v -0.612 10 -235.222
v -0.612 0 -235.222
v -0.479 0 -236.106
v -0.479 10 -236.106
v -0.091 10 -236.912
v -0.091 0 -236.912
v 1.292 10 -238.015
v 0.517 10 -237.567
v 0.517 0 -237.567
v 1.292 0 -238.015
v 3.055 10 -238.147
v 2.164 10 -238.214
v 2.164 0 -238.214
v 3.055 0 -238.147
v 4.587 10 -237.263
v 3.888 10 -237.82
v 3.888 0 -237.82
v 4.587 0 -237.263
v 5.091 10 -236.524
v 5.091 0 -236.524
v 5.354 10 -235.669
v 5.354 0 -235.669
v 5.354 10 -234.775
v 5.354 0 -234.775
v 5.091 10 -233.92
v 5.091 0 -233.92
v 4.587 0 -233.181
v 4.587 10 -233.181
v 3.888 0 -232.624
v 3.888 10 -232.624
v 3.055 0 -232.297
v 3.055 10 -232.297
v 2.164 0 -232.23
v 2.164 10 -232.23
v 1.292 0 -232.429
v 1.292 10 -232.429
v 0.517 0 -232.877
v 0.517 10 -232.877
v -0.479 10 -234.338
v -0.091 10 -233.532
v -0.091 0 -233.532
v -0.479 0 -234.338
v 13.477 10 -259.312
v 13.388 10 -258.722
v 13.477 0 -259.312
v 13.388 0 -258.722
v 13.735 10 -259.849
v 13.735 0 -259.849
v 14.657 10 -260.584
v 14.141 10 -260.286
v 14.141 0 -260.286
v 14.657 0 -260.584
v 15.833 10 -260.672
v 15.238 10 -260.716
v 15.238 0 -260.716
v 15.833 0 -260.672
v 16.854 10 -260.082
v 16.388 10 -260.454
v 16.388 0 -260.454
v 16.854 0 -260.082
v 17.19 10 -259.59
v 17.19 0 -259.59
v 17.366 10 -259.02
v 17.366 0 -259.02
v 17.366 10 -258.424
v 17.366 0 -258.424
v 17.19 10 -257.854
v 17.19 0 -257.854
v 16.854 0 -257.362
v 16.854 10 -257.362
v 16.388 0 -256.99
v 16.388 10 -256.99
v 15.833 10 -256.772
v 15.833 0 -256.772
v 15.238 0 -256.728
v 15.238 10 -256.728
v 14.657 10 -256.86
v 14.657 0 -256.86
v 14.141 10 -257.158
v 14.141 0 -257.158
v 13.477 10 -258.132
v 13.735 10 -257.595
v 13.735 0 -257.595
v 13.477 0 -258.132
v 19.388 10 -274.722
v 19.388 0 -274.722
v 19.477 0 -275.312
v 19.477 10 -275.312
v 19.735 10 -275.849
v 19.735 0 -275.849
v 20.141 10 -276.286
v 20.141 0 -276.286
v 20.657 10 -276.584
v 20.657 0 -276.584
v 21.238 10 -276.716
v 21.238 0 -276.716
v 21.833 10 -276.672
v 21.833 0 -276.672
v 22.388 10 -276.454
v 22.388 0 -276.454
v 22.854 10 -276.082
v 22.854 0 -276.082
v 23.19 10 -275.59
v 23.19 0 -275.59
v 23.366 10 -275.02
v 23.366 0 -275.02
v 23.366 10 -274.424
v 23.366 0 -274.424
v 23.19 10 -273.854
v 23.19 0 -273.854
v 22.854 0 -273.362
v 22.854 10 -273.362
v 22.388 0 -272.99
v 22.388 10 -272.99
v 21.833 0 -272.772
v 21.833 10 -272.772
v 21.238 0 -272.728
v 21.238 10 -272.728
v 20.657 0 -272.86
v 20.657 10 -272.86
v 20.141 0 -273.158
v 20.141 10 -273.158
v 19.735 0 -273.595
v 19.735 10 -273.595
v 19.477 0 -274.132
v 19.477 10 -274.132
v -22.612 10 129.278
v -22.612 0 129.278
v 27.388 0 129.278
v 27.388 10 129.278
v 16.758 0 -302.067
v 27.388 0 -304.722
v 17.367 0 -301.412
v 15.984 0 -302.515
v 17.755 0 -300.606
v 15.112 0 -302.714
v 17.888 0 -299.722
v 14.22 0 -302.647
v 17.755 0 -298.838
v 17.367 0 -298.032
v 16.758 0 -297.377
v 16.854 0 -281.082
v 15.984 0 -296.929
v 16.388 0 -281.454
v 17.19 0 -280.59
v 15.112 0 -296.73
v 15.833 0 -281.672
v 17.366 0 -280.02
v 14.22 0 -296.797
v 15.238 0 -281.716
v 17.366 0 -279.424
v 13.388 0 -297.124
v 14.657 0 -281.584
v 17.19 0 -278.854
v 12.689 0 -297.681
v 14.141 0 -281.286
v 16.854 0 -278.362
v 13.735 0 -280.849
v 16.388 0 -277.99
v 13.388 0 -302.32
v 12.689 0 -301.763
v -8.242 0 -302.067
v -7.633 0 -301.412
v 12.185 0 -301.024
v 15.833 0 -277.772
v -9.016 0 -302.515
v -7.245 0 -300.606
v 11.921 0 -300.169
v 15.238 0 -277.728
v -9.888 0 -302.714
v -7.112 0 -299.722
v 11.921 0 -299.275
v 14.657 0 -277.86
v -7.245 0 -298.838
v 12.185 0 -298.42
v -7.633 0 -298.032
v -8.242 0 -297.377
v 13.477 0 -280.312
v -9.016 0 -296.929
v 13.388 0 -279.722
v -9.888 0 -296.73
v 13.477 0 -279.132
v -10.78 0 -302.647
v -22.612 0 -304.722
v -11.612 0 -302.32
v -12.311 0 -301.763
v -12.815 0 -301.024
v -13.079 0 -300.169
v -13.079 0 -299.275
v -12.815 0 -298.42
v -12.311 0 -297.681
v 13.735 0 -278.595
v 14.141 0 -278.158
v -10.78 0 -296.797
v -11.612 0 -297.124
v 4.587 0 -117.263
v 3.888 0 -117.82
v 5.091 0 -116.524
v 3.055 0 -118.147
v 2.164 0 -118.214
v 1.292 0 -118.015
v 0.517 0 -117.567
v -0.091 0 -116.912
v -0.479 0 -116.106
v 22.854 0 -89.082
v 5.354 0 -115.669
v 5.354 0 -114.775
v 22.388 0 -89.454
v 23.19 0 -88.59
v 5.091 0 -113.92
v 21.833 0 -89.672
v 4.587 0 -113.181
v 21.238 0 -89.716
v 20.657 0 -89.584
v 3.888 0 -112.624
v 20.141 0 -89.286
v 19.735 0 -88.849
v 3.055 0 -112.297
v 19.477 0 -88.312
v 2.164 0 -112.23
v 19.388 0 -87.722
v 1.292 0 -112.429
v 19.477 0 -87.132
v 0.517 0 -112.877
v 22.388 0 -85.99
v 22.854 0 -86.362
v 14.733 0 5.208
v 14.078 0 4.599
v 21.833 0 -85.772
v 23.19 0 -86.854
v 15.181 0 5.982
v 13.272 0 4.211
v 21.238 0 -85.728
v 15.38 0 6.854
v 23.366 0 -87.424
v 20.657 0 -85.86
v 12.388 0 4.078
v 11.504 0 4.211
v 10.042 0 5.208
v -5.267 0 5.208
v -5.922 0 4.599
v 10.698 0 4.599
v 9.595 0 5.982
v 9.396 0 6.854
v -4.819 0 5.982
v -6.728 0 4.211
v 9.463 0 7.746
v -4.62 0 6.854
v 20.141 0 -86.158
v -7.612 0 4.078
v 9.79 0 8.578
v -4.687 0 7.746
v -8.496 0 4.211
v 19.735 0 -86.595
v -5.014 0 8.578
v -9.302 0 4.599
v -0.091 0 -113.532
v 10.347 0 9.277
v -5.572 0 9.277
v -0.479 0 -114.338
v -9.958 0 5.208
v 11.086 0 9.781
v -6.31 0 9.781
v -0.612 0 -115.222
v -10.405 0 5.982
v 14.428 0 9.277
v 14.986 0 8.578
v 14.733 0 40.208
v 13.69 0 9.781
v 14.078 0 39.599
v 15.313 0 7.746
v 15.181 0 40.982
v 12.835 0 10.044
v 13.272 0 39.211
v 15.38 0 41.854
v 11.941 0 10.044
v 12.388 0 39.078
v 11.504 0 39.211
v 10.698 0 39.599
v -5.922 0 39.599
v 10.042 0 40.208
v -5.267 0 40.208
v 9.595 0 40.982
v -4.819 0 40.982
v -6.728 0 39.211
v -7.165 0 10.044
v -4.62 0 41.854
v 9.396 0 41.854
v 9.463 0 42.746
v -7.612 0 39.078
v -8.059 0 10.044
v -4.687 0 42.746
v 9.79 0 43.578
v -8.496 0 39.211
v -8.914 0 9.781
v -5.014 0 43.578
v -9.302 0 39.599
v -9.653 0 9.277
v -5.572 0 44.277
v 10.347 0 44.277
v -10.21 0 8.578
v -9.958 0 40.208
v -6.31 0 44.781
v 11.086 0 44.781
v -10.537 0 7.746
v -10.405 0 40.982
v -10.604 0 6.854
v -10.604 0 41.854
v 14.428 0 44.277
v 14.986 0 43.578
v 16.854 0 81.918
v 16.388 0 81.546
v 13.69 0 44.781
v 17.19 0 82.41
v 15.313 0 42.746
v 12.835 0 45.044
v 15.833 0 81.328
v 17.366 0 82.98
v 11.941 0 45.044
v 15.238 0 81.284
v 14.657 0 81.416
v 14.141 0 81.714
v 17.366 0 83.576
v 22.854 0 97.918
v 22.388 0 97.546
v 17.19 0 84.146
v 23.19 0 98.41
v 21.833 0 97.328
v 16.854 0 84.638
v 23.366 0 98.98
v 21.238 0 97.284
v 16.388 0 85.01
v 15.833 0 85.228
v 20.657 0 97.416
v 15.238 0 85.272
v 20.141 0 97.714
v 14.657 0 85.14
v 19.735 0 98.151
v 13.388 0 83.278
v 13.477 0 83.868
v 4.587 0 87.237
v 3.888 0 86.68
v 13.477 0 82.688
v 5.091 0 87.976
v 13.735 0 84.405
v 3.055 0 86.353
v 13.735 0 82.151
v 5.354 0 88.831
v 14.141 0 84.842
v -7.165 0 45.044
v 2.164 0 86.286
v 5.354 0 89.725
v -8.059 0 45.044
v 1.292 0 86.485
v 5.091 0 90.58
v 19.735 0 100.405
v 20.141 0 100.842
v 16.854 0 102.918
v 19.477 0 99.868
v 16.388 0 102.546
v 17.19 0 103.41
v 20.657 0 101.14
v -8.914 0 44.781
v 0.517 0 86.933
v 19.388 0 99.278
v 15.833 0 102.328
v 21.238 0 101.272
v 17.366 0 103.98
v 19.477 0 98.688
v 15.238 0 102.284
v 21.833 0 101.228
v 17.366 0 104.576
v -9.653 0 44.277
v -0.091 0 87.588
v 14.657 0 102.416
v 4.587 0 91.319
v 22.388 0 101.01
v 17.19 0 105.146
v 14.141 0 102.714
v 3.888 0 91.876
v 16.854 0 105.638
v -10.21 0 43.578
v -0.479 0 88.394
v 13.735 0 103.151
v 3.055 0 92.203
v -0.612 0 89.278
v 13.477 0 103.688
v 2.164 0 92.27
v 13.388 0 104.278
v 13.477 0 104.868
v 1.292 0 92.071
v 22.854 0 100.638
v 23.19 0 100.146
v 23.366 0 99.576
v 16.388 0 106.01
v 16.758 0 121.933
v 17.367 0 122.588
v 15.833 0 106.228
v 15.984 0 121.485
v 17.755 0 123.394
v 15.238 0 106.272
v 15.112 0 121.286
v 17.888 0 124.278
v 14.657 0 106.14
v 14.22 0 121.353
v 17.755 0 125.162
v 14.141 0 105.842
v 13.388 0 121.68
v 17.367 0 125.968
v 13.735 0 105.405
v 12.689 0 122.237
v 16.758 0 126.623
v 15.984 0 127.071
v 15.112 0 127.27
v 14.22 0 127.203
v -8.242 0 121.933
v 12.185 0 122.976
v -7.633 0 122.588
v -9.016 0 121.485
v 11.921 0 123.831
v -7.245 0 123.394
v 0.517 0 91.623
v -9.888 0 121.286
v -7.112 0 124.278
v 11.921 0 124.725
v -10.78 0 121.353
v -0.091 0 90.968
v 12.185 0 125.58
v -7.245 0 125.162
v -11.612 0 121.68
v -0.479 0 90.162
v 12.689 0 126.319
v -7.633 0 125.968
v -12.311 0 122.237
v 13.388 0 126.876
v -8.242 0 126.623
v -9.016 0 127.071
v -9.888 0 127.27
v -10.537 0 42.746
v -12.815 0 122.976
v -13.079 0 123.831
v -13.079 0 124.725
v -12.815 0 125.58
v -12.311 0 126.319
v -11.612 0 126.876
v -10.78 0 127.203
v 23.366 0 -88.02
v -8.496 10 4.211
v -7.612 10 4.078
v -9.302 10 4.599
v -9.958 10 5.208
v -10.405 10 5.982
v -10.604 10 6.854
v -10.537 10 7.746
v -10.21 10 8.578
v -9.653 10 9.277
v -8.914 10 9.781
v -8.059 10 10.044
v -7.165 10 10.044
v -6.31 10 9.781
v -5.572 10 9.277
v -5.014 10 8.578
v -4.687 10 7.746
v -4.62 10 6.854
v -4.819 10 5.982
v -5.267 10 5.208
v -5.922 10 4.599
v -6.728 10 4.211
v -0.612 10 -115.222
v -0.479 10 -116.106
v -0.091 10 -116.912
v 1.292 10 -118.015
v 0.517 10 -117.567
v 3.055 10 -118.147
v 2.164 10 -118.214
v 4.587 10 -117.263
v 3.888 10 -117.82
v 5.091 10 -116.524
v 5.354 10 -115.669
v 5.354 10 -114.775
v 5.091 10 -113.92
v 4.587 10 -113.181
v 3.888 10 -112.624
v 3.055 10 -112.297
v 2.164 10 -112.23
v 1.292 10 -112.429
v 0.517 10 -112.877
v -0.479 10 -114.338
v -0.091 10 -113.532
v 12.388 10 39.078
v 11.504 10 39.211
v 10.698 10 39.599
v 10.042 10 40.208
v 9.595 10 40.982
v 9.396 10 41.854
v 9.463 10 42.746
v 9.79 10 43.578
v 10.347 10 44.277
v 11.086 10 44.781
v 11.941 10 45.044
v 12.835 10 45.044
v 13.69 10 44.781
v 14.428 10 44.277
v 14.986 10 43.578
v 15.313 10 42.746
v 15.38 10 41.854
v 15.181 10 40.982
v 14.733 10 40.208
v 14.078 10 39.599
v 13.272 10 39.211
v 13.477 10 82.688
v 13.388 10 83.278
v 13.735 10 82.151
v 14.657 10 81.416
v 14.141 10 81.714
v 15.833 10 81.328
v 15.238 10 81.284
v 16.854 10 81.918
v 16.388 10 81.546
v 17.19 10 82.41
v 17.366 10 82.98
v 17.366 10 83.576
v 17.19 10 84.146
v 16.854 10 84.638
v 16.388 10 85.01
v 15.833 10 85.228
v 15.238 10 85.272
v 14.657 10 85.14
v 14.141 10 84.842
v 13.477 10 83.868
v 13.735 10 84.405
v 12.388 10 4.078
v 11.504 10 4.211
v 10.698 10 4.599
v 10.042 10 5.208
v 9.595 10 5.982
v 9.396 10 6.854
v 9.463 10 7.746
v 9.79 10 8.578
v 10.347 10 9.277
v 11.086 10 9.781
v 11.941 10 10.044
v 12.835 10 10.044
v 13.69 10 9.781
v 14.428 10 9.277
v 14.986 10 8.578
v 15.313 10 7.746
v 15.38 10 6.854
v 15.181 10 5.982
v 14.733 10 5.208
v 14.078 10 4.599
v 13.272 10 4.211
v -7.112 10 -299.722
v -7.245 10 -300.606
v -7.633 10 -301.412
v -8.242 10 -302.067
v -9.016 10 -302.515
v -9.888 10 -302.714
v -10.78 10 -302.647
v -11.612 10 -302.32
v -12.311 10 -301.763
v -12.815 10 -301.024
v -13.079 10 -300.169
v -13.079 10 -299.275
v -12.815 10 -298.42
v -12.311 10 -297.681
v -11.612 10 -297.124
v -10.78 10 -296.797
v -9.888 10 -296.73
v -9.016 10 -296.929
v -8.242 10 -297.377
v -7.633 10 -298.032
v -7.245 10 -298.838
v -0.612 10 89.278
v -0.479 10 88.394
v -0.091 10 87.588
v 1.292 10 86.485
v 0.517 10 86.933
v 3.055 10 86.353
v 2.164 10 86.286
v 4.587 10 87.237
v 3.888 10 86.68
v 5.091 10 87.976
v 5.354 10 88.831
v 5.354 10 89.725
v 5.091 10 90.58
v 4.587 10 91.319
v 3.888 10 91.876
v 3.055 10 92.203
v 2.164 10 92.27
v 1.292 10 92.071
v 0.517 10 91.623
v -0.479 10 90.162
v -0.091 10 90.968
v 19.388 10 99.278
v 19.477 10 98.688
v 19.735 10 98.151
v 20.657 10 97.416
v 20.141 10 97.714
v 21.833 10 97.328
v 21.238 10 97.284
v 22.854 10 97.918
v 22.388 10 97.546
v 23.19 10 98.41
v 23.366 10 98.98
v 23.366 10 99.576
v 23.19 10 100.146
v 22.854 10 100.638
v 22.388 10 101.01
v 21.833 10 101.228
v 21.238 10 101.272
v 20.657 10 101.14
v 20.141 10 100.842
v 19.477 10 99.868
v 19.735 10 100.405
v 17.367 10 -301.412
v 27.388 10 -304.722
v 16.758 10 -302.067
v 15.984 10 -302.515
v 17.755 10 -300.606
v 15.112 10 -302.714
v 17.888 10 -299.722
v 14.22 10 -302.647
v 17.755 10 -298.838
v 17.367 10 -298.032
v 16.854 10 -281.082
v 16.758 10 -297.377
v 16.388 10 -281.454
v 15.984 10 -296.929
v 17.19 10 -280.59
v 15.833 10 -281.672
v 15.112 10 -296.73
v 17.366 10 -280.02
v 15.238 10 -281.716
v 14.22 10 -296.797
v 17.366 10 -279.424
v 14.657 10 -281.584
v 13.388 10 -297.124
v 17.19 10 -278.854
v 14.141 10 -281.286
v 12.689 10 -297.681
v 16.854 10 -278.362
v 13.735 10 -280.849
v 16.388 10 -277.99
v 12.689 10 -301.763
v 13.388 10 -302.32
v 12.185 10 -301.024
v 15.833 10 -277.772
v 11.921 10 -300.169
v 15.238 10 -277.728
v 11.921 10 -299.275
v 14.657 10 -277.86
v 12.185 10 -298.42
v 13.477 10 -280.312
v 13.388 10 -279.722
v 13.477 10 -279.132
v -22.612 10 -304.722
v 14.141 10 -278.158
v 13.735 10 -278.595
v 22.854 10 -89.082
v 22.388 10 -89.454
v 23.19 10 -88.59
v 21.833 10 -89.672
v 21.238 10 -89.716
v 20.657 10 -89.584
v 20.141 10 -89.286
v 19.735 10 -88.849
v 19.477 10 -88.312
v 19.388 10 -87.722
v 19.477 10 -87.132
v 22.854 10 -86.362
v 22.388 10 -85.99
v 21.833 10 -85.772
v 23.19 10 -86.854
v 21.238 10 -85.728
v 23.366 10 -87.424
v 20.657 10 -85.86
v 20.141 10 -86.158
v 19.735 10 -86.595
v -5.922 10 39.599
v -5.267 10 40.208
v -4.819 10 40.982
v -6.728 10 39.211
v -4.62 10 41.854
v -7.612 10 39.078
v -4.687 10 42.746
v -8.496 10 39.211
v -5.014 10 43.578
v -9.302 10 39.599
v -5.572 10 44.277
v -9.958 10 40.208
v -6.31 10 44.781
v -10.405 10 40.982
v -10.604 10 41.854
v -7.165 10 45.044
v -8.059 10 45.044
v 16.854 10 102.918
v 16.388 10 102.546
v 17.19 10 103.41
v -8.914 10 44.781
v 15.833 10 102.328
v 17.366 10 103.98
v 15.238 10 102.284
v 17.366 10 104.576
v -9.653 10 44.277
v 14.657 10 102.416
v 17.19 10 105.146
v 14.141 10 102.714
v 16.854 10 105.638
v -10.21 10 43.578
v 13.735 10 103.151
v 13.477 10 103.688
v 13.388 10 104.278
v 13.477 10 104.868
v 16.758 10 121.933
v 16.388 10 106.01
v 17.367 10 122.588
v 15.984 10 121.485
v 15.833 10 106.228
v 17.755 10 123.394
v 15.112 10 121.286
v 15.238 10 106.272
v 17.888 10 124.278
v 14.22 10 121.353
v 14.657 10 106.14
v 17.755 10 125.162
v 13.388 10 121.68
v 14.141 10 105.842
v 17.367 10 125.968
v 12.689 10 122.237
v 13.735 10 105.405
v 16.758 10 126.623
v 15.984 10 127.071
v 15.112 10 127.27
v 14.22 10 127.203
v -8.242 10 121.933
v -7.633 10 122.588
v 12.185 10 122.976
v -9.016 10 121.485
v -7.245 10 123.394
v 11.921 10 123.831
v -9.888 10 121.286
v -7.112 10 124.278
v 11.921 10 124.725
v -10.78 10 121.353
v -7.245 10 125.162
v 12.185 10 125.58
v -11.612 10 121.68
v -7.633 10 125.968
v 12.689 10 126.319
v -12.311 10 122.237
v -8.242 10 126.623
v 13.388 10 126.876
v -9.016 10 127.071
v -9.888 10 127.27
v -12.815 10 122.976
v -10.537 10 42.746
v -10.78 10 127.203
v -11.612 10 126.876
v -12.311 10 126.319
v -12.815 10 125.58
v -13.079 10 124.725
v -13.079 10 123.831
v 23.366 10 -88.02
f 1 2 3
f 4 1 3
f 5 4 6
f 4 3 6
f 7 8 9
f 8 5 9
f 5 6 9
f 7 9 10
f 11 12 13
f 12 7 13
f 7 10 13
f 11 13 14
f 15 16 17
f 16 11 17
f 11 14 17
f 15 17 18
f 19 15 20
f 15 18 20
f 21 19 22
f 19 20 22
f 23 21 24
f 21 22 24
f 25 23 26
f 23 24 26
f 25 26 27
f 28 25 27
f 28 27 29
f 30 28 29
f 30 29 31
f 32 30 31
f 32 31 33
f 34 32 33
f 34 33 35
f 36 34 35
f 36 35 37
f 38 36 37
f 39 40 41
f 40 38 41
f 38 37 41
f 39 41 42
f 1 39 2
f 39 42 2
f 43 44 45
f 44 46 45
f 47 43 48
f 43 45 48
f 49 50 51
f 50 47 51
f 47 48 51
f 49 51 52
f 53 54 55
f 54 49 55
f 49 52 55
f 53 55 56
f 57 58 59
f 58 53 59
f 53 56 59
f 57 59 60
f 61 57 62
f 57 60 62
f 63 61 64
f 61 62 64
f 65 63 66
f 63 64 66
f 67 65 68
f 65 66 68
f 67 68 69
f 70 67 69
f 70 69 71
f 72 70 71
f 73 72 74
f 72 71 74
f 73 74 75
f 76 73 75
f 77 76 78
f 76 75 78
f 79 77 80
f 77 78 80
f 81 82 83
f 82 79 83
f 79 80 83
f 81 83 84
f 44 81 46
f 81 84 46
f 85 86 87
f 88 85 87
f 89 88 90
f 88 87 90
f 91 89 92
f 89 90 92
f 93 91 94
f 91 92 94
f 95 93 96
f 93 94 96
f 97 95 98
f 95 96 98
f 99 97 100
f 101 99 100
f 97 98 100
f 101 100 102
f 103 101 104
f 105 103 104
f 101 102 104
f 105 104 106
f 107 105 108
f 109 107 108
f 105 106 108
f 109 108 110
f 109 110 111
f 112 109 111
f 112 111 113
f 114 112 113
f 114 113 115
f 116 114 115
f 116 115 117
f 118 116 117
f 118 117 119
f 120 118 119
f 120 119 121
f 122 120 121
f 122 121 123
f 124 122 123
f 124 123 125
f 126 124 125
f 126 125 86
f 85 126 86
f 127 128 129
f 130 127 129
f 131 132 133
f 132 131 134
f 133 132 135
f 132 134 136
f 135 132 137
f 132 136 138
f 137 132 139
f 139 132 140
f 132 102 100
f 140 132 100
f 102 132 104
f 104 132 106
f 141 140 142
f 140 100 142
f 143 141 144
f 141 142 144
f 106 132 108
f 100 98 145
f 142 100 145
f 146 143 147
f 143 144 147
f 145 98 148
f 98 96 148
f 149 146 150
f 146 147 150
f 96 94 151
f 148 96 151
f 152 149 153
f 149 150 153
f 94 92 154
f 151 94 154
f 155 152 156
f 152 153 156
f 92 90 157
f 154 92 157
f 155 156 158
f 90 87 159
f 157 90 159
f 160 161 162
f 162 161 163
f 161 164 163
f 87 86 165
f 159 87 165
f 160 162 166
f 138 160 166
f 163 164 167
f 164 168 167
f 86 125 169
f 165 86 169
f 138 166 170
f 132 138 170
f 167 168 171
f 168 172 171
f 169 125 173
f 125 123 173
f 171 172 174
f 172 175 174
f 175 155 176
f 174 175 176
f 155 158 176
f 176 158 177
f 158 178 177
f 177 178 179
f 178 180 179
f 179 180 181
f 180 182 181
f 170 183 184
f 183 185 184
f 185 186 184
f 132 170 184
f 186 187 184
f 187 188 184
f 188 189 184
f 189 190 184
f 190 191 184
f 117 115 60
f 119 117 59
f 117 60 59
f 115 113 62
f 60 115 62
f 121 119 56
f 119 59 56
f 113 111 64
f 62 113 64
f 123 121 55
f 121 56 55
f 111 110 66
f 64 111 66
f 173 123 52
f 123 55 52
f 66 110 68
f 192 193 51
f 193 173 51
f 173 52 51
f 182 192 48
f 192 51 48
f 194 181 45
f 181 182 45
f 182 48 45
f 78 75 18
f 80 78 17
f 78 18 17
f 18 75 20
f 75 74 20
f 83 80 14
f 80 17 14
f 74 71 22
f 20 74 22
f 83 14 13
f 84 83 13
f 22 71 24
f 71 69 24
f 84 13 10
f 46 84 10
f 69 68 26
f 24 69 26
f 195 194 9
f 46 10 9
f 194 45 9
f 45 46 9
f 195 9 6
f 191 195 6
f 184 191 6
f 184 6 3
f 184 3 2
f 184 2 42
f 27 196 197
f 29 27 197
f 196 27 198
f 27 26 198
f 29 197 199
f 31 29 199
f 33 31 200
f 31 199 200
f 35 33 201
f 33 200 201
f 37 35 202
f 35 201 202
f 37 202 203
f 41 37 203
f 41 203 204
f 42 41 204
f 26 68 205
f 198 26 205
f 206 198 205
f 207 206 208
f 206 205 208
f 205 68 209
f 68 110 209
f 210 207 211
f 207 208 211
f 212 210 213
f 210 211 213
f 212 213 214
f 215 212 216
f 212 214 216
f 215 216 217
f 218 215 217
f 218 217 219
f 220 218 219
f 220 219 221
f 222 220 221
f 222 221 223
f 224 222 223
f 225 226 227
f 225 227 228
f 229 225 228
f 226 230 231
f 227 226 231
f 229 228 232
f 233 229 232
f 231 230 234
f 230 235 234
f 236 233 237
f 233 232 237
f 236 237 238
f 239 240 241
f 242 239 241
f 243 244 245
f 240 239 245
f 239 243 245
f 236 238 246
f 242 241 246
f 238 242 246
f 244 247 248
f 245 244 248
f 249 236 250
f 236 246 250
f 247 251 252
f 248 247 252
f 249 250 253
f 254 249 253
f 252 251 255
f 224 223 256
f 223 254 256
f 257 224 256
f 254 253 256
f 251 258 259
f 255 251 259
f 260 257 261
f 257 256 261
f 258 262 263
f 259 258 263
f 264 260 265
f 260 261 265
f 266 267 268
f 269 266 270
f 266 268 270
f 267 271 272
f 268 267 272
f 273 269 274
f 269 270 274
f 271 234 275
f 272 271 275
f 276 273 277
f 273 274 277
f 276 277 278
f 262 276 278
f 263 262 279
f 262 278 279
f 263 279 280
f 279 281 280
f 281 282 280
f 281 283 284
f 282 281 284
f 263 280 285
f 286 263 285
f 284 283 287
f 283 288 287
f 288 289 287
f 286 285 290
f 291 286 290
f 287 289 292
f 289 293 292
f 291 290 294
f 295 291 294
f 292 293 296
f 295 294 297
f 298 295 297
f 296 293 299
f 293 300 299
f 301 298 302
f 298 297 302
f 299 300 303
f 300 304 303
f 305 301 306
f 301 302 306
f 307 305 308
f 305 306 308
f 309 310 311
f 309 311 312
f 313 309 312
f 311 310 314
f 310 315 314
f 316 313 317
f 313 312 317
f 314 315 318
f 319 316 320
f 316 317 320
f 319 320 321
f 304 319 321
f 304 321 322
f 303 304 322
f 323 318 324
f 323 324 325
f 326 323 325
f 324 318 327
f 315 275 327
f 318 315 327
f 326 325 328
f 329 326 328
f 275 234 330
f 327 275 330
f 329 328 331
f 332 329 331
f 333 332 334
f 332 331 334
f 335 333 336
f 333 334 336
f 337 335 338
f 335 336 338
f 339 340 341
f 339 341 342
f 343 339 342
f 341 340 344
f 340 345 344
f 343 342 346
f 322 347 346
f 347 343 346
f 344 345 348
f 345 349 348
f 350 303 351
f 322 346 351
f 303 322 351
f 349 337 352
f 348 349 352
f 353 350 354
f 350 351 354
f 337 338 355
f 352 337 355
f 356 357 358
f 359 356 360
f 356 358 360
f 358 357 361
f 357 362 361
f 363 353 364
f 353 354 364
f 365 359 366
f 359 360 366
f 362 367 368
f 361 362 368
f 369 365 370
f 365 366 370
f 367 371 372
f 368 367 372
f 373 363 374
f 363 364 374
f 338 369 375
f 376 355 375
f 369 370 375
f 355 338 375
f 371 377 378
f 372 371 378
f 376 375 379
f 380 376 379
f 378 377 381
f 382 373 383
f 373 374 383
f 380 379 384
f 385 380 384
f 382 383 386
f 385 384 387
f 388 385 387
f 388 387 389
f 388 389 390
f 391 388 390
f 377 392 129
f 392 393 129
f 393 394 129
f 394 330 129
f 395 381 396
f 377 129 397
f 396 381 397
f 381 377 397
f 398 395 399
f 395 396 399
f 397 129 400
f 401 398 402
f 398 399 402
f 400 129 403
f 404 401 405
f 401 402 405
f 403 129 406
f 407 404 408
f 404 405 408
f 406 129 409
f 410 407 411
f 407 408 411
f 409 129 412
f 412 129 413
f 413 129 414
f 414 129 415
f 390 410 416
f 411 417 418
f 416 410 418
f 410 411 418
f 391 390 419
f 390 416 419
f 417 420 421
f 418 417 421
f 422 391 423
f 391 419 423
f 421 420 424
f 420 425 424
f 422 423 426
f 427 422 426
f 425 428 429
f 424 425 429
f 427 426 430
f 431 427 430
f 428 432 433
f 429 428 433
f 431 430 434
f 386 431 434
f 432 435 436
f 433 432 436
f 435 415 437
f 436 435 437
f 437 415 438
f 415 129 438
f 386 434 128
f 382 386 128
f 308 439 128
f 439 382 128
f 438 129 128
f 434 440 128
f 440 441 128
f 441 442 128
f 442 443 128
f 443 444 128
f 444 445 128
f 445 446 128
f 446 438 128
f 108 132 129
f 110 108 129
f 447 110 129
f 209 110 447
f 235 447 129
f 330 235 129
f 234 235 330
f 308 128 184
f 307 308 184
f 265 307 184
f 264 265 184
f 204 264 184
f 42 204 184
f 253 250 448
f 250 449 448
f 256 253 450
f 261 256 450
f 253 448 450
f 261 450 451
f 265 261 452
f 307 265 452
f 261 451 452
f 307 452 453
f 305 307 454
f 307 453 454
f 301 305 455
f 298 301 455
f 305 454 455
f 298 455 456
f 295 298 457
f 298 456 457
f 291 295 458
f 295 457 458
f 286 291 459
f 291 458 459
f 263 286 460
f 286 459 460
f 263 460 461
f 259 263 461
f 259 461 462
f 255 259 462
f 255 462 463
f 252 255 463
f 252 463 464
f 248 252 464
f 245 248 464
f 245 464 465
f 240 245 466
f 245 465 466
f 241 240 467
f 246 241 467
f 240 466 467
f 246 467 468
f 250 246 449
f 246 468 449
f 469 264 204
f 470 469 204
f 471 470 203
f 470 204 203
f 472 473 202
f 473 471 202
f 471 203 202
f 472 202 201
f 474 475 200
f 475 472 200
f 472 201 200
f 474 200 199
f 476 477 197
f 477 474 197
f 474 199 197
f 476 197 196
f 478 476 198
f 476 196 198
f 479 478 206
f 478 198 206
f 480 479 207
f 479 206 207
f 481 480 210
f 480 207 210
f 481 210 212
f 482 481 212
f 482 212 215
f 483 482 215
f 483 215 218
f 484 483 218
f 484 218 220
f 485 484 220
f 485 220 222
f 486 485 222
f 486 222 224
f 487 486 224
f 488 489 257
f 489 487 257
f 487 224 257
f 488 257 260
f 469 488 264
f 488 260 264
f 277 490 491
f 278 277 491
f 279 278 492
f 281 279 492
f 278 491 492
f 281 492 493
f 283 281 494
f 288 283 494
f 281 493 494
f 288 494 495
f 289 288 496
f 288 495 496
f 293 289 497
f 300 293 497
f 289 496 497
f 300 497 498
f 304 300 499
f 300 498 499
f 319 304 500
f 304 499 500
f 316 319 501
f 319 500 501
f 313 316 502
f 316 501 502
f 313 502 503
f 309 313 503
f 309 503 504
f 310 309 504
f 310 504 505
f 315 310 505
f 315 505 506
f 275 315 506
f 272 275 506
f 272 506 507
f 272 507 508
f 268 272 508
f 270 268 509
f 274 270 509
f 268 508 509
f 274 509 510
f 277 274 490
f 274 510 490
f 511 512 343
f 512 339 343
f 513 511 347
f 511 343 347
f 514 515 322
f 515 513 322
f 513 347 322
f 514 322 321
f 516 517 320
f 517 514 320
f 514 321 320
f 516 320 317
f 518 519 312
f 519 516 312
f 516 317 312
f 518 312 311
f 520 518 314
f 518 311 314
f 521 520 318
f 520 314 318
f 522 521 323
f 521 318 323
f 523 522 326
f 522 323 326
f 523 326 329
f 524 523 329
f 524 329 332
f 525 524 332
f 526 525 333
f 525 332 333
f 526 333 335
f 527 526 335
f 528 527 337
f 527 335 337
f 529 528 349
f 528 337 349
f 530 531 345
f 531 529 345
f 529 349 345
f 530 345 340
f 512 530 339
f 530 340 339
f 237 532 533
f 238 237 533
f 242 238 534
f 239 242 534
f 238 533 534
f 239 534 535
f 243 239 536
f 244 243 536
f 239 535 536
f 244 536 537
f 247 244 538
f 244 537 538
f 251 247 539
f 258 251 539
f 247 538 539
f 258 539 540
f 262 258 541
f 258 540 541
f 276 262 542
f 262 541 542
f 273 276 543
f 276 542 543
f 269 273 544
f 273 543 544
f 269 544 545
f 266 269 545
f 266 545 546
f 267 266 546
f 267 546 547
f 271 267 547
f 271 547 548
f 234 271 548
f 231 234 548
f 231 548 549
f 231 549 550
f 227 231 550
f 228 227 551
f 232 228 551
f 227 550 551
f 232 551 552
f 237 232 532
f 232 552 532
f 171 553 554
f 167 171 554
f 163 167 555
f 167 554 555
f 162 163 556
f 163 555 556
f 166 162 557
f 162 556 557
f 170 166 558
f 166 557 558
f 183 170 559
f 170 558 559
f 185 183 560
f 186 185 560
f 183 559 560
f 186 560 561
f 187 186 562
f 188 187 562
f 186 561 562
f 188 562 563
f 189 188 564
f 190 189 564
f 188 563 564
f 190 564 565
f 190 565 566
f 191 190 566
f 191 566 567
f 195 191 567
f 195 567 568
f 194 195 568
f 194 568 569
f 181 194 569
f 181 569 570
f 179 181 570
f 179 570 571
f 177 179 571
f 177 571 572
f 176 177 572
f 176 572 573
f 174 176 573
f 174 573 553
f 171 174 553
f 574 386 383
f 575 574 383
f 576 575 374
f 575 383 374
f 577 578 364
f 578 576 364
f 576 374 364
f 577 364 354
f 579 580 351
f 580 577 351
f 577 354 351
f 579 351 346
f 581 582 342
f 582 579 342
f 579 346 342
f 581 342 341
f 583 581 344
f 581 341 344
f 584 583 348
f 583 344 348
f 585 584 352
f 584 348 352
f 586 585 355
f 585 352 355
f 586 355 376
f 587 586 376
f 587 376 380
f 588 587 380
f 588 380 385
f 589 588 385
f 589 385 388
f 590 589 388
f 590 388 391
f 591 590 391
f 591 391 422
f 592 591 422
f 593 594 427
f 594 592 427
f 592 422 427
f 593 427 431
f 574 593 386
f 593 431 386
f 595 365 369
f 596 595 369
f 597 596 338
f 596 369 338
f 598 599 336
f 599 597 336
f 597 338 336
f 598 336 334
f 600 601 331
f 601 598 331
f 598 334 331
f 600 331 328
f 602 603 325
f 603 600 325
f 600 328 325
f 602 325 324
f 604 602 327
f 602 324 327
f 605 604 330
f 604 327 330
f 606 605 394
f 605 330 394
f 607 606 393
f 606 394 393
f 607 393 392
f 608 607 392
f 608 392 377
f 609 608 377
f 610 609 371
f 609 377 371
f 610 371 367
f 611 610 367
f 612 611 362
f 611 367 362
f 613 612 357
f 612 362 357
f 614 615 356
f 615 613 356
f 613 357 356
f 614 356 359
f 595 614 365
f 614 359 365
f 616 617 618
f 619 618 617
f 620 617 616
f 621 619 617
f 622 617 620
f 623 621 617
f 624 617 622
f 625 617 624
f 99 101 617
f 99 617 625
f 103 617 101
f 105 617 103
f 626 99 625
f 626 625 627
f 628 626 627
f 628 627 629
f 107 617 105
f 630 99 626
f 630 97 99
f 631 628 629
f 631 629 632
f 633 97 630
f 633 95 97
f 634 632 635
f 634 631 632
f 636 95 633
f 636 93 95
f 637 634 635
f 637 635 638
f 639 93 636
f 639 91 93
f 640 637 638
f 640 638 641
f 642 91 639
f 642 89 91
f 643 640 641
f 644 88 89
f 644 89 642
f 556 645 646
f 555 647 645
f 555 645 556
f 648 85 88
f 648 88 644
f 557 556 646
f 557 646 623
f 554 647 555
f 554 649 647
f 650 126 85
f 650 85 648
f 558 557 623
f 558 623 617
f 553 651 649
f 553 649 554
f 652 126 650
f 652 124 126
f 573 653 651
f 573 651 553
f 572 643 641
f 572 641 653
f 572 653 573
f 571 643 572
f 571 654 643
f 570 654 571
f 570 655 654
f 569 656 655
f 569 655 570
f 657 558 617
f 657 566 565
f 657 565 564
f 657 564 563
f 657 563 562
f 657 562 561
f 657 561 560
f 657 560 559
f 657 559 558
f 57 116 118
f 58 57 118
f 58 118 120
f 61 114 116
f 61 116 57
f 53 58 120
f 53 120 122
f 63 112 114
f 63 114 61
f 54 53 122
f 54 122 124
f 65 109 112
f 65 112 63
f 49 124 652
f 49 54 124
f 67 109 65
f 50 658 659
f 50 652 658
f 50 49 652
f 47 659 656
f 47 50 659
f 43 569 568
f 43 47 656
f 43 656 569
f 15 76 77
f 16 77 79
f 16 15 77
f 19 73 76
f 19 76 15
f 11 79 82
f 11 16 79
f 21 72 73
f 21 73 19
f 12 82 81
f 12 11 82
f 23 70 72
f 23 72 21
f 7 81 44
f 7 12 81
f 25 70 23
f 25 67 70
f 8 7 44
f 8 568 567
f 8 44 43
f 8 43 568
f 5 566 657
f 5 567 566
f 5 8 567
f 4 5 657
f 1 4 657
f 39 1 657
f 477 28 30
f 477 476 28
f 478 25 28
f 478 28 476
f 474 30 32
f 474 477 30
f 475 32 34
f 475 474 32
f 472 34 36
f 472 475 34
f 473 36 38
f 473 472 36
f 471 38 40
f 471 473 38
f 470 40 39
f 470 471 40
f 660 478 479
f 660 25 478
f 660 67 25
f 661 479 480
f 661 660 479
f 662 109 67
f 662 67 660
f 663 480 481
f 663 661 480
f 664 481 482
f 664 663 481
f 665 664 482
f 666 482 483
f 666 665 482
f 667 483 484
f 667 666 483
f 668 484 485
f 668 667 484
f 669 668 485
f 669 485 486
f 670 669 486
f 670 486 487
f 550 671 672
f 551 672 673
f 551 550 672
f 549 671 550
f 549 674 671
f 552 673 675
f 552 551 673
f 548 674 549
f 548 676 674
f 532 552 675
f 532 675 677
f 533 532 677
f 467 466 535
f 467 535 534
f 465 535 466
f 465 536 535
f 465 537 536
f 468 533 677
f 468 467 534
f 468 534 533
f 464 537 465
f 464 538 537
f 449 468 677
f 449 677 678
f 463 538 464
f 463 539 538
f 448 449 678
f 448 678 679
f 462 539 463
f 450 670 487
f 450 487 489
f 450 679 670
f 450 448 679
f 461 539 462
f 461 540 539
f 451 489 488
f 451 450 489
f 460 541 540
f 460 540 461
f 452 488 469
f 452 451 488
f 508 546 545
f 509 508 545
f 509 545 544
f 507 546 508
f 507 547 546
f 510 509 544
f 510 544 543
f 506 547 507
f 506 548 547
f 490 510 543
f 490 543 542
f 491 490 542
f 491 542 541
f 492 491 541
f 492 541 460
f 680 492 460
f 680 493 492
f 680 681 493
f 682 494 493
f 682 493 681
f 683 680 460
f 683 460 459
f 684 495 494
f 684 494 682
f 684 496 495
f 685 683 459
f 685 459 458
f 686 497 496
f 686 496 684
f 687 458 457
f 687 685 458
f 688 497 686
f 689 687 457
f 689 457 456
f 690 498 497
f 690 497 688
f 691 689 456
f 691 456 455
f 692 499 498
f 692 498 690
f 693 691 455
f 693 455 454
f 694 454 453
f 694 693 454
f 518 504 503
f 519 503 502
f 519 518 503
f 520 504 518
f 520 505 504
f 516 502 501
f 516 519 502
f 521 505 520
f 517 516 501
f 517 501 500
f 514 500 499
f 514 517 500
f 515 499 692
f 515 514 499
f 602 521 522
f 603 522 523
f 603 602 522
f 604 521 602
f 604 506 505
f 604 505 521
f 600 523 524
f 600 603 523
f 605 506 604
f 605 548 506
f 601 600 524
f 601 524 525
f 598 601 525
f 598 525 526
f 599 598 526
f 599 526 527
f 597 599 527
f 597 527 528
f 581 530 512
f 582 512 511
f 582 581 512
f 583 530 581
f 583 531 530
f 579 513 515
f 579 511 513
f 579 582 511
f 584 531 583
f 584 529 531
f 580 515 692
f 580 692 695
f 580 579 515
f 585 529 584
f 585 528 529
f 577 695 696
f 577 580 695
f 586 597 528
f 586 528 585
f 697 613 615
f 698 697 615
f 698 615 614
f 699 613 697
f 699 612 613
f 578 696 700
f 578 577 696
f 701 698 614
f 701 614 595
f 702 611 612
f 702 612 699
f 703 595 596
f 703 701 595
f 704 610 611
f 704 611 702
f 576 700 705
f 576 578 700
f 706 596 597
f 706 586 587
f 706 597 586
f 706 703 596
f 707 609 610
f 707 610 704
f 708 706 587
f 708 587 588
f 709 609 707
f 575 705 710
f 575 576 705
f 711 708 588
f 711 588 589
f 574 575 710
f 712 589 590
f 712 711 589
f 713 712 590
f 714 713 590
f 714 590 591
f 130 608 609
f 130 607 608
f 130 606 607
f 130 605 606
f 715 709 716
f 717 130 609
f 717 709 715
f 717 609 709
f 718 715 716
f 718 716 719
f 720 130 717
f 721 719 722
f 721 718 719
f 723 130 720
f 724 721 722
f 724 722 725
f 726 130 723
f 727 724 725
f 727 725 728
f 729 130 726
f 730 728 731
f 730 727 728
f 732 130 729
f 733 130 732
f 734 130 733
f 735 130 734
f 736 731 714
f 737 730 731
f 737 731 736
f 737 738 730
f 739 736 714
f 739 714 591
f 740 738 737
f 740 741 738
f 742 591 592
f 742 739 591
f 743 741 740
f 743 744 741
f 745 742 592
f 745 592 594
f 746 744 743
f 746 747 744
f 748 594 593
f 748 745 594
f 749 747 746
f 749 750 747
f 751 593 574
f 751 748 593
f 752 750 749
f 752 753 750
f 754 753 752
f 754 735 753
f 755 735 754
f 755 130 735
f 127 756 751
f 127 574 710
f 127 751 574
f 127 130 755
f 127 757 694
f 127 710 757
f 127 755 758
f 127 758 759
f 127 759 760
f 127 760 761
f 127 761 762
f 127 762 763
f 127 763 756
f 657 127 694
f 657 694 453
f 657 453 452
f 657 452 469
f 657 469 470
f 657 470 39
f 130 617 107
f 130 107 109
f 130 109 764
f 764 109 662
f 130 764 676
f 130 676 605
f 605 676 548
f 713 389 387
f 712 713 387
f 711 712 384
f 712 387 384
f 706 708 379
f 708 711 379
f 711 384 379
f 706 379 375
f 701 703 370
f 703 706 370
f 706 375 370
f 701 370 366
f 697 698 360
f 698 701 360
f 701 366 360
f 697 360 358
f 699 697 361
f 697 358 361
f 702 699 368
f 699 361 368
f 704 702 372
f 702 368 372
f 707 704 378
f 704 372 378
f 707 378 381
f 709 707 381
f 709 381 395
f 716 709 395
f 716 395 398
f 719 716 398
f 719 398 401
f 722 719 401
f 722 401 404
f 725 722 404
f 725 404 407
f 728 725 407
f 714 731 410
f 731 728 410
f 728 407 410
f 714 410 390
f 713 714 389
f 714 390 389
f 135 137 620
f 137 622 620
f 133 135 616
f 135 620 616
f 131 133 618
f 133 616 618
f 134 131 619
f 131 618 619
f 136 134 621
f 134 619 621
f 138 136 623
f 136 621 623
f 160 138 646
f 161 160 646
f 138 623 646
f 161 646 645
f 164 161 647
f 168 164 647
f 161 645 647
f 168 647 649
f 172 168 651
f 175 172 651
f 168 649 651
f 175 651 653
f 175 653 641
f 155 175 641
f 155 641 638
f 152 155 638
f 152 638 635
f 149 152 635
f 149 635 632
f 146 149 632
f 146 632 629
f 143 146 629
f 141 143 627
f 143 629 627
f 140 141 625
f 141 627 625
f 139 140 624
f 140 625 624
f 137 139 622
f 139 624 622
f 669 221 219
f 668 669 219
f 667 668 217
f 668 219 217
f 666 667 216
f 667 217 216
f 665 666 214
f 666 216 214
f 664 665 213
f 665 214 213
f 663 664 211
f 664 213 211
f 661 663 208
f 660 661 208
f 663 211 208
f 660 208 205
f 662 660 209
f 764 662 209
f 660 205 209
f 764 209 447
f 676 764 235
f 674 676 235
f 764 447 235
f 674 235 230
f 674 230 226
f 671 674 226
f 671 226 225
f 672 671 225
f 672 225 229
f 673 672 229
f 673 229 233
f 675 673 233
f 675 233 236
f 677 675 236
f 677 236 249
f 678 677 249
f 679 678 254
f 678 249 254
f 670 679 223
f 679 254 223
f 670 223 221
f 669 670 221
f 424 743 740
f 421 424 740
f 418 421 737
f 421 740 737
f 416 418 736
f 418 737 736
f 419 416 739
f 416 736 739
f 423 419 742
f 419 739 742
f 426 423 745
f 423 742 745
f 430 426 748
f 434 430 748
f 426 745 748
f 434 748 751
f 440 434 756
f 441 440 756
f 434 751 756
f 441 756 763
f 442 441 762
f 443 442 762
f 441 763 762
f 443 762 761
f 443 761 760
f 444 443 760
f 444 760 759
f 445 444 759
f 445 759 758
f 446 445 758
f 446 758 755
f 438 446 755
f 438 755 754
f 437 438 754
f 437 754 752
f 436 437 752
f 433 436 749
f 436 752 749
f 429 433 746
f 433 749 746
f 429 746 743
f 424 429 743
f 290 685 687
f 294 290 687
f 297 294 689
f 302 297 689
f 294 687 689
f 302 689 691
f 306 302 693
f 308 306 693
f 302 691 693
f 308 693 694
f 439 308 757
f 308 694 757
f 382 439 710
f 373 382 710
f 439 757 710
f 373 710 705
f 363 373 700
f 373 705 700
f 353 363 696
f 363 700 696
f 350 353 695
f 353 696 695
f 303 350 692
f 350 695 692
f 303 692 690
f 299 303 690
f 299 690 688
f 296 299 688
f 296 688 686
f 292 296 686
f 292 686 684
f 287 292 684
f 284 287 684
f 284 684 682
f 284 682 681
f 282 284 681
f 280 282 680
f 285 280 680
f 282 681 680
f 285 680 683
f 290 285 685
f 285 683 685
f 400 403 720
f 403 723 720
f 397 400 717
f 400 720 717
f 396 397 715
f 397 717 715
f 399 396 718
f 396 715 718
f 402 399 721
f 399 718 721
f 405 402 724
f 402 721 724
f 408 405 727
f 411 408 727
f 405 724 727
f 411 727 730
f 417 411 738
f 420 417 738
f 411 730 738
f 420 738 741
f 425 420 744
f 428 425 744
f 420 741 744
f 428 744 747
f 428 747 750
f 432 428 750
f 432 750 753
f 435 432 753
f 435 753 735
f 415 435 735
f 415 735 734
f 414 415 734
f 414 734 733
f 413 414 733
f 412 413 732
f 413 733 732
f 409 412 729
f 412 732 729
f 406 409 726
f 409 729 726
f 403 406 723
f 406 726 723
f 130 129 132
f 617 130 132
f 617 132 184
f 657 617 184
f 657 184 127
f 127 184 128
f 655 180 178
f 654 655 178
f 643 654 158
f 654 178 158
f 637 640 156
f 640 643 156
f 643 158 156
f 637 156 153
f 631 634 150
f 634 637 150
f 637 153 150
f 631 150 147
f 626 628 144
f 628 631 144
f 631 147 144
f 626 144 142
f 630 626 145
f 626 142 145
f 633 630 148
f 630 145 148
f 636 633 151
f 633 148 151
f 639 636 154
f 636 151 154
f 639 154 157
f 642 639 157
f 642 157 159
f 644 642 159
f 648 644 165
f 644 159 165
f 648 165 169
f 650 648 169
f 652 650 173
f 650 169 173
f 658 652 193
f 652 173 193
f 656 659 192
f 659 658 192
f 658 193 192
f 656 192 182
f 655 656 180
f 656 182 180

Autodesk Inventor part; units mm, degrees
ref_plane "YZ Plane" through (0, 0, 0) normal (1, 0, 0) x (0, 1, 0)
ref_plane "XZ Plane" through (0, 0, 0) normal (0, 1, 0) x (-1, 0, 0)
ref_plane "XY Plane" through (0, 0, 0) normal (0, 0, 1) x (1, 0, 0)
sketch "Boceto1" plane through (0, 0, 0) normal (0, 1, 0) x (-1, 0, 0)
  line L0 (22.6121, 129.278) -> (-27.3879, 129.278)
  line L1 (-27.3879, 129.278) -> (-27.3879, -304.722)
  line L2 (-27.3879, -304.722) -> (22.6121, -304.722)
  line L3 (22.6121, -304.722) -> (22.6121, 129.278)
  circle A0 centre (-15.3879, 104.278) radius 2
  circle A1 centre (-15.3879, 83.278) radius 2
  line L4 (-27.3879, -87.722) -> (-4.9043, -87.722)
  circle A2 centre (-15.3879, -279.722) radius 2
  circle A3 centre (-15.3879, -258.722) radius 2
  line L5 (-27.3879, -304.722) -> (-21.3879, -304.722)
  line L6 (-21.3879, -304.722) -> (-21.3879, -274.722)
  circle A4 centre (-21.3879, -274.722) radius 2
  circle A5 centre (-21.3879, -87.722) radius 2
  circle A6 centre (-21.3879, 99.278) radius 2
  circle A7 centre (-2.3879, -235.222) radius 3
  circle A8 centre (-2.3879, -115.222) radius 3
  circle A9 centre (-2.3879, 89.278) radius 3
  dimension "d4" = 434
  dimension "d5" = 50
  dimension "d16" = 4
  dimension "d17" = 4
  dimension "d18" = 25
  dimension "d19" = 21
  dimension "d20" = 12
  dimension "d21" = 12
  dimension "d85" = 12
  dimension "d86" = 12
  dimension "d87" = 21
  dimension "d89" = 30
  dimension "d90" = 4
  dimension "d91" = 4
  dimension "d92" = 44
  dimension "d93" = 44
  dimension "d94" = 217
  dimension "d95" = 6
  dimension "d96" = 25
  dimension "d97" = 69.5
  dimension "d98" = 6
  dimension "d99" = 120
  dimension "d100" = 25
  dimension "d101" = 6
  dimension "d102" = 25
  dimension "d103" = 40
extrude "Extrusión1" add sketch "Boceto1" along normal blind 10
sketch "Boceto2" plane through (0, 10, 0) normal (0, 1, 0) x (1, 0, 0)
  line L0 (-22.6121, -129.278) -> (27.3879, -129.278) projected
  line L1 (-22.6121, -129.278) -> (-22.6121, -124.278)
  line L2 (-22.6121, 304.722) -> (-22.6121, -129.278) projected
  line L3 (-22.6121, -124.278) -> (27.3879, -124.278)
  line L4 (27.3879, -129.278) -> (27.3879, 304.722) projected
  line L5 (27.3879, 304.722) -> (-22.6121, 304.722) projected
  line L6 (-22.6121, 304.722) -> (-22.6121, 299.722)
  line L7 (-22.6121, 299.722) -> (27.3879, 299.722)
  line L8 (-22.6121, -124.278) -> (-10.1121, -124.278)
  line L9 (27.3879, 299.722) -> (14.8879, 299.722)
  circle A0 centre (-10.1121, -124.278) radius 3
  circle A1 centre (14.8879, -124.278) radius 3
  circle A2 centre (-10.1121, 299.722) radius 3
  circle A3 centre (14.8879, 299.722) radius 3
  dimension "d6" = 5
  dimension "d7" = 5
  dimension "d8" = 12.5
  dimension "d9" = 12.5
  dimension "d10" = 6
  dimension "d11" = 6
  dimension "d12" = 6
  dimension "d13" = 6
  dimension "d30" = 5
  dimension "d74" = 5
extrude "Extrusión2" cut sketch "Boceto2" against normal blind 20 contours A0 L3 | L3 A0 | A1 L3 | L3 A1 | A2 L7 | L7 A2 | A3 L7 | L7 A3
thread "Thread1" size "M4x0.7" class "6H" standard "ANSI Metric M Profile" length 40
thread "Thread2" size "M4x0.7" class "6H" standard "ANSI Metric M Profile" length 40
sketch "Boceto3" plane through (0, 0, 0) normal (0, -1, 0) x (1, 0, 0)
  line L0 (27.3879, 129.278) -> (27.3879, -304.722) projected
  line L1 (12.3879, 42.078) -> (-7.6121, 42.078)
  line L2 (-7.6121, 42.078) -> (-7.6121, 7.078)
  line L3 (-7.6121, 7.078) -> (12.3879, 7.078)
  line L4 (12.3879, 7.078) -> (12.3879, 42.078)
  circle A0 centre (12.3879, 7.078) radius 3
  circle A1 centre (-7.6121, 7.078) radius 3
  circle A2 centre (12.3879, 42.078) radius 3
  circle A3 centre (-7.6121, 42.078) radius 3
  line L5 (-22.6121, 129.278) -> (27.3879, 129.278) projected
  line L6 (-22.6121, -304.722) -> (-22.6121, 129.278) projected
  point P0 (-14161.5164, 17179.1084)
  point P1 (-14161.5164, 17617.1084)
  point P2 (-14211.5164, 17617.1084)
  point P3 (-14211.5164, 17179.1084)
  dimension "d58" = 35
  dimension "d59" = 15
  dimension "d60" = 87.2
  dimension "d61" = 15
  dimension "d62" = 20
hole "Agujero1" at (12.3879, 0, 42.078) at (-7.6121, 0, 42.078) at (12.3879, 0, 7.078) at (-7.6121, 0, 7.078) direction (0, 1, 0) diameter 6 depth 12 tip angle 118
thread "Rosca5" size "M4x0.7" class "6H" standard "ISO Metric profile" length 430
thread "Rosca6" size "M4x0.7" class "6H" standard "ISO Metric profile" length 430
thread "Rosca7" size "M6x1" class "6H" standard "ISO Metric profile" length 430
thread "Rosca8" size "M6x1" class "6H" standard "ISO Metric profile" length 430
thread "Rosca9" size "M6x1" class "6H" standard "ISO Metric profile" length 430
thread "Rosca10" size "M6x1" class "6H" standard "ISO Metric profile" length 430
thread "Rosca11" size "M4x0.7" class "6H" standard "ISO Metric profile" length 430
thread "Rosca12" size "M6x1" class "6H" standard "ISO Metric profile" length 100
thread "Rosca13" size "M6x1" class "6H" standard "ISO Metric profile" length 100
thread "Rosca14" size "M6x1" class "6H" standard "ISO Metric profile" length 100
equation "\"d100\" = d96"
equation "\"d102\" = d96"
properties part number "Lateral" material "Aluminio 6061"
